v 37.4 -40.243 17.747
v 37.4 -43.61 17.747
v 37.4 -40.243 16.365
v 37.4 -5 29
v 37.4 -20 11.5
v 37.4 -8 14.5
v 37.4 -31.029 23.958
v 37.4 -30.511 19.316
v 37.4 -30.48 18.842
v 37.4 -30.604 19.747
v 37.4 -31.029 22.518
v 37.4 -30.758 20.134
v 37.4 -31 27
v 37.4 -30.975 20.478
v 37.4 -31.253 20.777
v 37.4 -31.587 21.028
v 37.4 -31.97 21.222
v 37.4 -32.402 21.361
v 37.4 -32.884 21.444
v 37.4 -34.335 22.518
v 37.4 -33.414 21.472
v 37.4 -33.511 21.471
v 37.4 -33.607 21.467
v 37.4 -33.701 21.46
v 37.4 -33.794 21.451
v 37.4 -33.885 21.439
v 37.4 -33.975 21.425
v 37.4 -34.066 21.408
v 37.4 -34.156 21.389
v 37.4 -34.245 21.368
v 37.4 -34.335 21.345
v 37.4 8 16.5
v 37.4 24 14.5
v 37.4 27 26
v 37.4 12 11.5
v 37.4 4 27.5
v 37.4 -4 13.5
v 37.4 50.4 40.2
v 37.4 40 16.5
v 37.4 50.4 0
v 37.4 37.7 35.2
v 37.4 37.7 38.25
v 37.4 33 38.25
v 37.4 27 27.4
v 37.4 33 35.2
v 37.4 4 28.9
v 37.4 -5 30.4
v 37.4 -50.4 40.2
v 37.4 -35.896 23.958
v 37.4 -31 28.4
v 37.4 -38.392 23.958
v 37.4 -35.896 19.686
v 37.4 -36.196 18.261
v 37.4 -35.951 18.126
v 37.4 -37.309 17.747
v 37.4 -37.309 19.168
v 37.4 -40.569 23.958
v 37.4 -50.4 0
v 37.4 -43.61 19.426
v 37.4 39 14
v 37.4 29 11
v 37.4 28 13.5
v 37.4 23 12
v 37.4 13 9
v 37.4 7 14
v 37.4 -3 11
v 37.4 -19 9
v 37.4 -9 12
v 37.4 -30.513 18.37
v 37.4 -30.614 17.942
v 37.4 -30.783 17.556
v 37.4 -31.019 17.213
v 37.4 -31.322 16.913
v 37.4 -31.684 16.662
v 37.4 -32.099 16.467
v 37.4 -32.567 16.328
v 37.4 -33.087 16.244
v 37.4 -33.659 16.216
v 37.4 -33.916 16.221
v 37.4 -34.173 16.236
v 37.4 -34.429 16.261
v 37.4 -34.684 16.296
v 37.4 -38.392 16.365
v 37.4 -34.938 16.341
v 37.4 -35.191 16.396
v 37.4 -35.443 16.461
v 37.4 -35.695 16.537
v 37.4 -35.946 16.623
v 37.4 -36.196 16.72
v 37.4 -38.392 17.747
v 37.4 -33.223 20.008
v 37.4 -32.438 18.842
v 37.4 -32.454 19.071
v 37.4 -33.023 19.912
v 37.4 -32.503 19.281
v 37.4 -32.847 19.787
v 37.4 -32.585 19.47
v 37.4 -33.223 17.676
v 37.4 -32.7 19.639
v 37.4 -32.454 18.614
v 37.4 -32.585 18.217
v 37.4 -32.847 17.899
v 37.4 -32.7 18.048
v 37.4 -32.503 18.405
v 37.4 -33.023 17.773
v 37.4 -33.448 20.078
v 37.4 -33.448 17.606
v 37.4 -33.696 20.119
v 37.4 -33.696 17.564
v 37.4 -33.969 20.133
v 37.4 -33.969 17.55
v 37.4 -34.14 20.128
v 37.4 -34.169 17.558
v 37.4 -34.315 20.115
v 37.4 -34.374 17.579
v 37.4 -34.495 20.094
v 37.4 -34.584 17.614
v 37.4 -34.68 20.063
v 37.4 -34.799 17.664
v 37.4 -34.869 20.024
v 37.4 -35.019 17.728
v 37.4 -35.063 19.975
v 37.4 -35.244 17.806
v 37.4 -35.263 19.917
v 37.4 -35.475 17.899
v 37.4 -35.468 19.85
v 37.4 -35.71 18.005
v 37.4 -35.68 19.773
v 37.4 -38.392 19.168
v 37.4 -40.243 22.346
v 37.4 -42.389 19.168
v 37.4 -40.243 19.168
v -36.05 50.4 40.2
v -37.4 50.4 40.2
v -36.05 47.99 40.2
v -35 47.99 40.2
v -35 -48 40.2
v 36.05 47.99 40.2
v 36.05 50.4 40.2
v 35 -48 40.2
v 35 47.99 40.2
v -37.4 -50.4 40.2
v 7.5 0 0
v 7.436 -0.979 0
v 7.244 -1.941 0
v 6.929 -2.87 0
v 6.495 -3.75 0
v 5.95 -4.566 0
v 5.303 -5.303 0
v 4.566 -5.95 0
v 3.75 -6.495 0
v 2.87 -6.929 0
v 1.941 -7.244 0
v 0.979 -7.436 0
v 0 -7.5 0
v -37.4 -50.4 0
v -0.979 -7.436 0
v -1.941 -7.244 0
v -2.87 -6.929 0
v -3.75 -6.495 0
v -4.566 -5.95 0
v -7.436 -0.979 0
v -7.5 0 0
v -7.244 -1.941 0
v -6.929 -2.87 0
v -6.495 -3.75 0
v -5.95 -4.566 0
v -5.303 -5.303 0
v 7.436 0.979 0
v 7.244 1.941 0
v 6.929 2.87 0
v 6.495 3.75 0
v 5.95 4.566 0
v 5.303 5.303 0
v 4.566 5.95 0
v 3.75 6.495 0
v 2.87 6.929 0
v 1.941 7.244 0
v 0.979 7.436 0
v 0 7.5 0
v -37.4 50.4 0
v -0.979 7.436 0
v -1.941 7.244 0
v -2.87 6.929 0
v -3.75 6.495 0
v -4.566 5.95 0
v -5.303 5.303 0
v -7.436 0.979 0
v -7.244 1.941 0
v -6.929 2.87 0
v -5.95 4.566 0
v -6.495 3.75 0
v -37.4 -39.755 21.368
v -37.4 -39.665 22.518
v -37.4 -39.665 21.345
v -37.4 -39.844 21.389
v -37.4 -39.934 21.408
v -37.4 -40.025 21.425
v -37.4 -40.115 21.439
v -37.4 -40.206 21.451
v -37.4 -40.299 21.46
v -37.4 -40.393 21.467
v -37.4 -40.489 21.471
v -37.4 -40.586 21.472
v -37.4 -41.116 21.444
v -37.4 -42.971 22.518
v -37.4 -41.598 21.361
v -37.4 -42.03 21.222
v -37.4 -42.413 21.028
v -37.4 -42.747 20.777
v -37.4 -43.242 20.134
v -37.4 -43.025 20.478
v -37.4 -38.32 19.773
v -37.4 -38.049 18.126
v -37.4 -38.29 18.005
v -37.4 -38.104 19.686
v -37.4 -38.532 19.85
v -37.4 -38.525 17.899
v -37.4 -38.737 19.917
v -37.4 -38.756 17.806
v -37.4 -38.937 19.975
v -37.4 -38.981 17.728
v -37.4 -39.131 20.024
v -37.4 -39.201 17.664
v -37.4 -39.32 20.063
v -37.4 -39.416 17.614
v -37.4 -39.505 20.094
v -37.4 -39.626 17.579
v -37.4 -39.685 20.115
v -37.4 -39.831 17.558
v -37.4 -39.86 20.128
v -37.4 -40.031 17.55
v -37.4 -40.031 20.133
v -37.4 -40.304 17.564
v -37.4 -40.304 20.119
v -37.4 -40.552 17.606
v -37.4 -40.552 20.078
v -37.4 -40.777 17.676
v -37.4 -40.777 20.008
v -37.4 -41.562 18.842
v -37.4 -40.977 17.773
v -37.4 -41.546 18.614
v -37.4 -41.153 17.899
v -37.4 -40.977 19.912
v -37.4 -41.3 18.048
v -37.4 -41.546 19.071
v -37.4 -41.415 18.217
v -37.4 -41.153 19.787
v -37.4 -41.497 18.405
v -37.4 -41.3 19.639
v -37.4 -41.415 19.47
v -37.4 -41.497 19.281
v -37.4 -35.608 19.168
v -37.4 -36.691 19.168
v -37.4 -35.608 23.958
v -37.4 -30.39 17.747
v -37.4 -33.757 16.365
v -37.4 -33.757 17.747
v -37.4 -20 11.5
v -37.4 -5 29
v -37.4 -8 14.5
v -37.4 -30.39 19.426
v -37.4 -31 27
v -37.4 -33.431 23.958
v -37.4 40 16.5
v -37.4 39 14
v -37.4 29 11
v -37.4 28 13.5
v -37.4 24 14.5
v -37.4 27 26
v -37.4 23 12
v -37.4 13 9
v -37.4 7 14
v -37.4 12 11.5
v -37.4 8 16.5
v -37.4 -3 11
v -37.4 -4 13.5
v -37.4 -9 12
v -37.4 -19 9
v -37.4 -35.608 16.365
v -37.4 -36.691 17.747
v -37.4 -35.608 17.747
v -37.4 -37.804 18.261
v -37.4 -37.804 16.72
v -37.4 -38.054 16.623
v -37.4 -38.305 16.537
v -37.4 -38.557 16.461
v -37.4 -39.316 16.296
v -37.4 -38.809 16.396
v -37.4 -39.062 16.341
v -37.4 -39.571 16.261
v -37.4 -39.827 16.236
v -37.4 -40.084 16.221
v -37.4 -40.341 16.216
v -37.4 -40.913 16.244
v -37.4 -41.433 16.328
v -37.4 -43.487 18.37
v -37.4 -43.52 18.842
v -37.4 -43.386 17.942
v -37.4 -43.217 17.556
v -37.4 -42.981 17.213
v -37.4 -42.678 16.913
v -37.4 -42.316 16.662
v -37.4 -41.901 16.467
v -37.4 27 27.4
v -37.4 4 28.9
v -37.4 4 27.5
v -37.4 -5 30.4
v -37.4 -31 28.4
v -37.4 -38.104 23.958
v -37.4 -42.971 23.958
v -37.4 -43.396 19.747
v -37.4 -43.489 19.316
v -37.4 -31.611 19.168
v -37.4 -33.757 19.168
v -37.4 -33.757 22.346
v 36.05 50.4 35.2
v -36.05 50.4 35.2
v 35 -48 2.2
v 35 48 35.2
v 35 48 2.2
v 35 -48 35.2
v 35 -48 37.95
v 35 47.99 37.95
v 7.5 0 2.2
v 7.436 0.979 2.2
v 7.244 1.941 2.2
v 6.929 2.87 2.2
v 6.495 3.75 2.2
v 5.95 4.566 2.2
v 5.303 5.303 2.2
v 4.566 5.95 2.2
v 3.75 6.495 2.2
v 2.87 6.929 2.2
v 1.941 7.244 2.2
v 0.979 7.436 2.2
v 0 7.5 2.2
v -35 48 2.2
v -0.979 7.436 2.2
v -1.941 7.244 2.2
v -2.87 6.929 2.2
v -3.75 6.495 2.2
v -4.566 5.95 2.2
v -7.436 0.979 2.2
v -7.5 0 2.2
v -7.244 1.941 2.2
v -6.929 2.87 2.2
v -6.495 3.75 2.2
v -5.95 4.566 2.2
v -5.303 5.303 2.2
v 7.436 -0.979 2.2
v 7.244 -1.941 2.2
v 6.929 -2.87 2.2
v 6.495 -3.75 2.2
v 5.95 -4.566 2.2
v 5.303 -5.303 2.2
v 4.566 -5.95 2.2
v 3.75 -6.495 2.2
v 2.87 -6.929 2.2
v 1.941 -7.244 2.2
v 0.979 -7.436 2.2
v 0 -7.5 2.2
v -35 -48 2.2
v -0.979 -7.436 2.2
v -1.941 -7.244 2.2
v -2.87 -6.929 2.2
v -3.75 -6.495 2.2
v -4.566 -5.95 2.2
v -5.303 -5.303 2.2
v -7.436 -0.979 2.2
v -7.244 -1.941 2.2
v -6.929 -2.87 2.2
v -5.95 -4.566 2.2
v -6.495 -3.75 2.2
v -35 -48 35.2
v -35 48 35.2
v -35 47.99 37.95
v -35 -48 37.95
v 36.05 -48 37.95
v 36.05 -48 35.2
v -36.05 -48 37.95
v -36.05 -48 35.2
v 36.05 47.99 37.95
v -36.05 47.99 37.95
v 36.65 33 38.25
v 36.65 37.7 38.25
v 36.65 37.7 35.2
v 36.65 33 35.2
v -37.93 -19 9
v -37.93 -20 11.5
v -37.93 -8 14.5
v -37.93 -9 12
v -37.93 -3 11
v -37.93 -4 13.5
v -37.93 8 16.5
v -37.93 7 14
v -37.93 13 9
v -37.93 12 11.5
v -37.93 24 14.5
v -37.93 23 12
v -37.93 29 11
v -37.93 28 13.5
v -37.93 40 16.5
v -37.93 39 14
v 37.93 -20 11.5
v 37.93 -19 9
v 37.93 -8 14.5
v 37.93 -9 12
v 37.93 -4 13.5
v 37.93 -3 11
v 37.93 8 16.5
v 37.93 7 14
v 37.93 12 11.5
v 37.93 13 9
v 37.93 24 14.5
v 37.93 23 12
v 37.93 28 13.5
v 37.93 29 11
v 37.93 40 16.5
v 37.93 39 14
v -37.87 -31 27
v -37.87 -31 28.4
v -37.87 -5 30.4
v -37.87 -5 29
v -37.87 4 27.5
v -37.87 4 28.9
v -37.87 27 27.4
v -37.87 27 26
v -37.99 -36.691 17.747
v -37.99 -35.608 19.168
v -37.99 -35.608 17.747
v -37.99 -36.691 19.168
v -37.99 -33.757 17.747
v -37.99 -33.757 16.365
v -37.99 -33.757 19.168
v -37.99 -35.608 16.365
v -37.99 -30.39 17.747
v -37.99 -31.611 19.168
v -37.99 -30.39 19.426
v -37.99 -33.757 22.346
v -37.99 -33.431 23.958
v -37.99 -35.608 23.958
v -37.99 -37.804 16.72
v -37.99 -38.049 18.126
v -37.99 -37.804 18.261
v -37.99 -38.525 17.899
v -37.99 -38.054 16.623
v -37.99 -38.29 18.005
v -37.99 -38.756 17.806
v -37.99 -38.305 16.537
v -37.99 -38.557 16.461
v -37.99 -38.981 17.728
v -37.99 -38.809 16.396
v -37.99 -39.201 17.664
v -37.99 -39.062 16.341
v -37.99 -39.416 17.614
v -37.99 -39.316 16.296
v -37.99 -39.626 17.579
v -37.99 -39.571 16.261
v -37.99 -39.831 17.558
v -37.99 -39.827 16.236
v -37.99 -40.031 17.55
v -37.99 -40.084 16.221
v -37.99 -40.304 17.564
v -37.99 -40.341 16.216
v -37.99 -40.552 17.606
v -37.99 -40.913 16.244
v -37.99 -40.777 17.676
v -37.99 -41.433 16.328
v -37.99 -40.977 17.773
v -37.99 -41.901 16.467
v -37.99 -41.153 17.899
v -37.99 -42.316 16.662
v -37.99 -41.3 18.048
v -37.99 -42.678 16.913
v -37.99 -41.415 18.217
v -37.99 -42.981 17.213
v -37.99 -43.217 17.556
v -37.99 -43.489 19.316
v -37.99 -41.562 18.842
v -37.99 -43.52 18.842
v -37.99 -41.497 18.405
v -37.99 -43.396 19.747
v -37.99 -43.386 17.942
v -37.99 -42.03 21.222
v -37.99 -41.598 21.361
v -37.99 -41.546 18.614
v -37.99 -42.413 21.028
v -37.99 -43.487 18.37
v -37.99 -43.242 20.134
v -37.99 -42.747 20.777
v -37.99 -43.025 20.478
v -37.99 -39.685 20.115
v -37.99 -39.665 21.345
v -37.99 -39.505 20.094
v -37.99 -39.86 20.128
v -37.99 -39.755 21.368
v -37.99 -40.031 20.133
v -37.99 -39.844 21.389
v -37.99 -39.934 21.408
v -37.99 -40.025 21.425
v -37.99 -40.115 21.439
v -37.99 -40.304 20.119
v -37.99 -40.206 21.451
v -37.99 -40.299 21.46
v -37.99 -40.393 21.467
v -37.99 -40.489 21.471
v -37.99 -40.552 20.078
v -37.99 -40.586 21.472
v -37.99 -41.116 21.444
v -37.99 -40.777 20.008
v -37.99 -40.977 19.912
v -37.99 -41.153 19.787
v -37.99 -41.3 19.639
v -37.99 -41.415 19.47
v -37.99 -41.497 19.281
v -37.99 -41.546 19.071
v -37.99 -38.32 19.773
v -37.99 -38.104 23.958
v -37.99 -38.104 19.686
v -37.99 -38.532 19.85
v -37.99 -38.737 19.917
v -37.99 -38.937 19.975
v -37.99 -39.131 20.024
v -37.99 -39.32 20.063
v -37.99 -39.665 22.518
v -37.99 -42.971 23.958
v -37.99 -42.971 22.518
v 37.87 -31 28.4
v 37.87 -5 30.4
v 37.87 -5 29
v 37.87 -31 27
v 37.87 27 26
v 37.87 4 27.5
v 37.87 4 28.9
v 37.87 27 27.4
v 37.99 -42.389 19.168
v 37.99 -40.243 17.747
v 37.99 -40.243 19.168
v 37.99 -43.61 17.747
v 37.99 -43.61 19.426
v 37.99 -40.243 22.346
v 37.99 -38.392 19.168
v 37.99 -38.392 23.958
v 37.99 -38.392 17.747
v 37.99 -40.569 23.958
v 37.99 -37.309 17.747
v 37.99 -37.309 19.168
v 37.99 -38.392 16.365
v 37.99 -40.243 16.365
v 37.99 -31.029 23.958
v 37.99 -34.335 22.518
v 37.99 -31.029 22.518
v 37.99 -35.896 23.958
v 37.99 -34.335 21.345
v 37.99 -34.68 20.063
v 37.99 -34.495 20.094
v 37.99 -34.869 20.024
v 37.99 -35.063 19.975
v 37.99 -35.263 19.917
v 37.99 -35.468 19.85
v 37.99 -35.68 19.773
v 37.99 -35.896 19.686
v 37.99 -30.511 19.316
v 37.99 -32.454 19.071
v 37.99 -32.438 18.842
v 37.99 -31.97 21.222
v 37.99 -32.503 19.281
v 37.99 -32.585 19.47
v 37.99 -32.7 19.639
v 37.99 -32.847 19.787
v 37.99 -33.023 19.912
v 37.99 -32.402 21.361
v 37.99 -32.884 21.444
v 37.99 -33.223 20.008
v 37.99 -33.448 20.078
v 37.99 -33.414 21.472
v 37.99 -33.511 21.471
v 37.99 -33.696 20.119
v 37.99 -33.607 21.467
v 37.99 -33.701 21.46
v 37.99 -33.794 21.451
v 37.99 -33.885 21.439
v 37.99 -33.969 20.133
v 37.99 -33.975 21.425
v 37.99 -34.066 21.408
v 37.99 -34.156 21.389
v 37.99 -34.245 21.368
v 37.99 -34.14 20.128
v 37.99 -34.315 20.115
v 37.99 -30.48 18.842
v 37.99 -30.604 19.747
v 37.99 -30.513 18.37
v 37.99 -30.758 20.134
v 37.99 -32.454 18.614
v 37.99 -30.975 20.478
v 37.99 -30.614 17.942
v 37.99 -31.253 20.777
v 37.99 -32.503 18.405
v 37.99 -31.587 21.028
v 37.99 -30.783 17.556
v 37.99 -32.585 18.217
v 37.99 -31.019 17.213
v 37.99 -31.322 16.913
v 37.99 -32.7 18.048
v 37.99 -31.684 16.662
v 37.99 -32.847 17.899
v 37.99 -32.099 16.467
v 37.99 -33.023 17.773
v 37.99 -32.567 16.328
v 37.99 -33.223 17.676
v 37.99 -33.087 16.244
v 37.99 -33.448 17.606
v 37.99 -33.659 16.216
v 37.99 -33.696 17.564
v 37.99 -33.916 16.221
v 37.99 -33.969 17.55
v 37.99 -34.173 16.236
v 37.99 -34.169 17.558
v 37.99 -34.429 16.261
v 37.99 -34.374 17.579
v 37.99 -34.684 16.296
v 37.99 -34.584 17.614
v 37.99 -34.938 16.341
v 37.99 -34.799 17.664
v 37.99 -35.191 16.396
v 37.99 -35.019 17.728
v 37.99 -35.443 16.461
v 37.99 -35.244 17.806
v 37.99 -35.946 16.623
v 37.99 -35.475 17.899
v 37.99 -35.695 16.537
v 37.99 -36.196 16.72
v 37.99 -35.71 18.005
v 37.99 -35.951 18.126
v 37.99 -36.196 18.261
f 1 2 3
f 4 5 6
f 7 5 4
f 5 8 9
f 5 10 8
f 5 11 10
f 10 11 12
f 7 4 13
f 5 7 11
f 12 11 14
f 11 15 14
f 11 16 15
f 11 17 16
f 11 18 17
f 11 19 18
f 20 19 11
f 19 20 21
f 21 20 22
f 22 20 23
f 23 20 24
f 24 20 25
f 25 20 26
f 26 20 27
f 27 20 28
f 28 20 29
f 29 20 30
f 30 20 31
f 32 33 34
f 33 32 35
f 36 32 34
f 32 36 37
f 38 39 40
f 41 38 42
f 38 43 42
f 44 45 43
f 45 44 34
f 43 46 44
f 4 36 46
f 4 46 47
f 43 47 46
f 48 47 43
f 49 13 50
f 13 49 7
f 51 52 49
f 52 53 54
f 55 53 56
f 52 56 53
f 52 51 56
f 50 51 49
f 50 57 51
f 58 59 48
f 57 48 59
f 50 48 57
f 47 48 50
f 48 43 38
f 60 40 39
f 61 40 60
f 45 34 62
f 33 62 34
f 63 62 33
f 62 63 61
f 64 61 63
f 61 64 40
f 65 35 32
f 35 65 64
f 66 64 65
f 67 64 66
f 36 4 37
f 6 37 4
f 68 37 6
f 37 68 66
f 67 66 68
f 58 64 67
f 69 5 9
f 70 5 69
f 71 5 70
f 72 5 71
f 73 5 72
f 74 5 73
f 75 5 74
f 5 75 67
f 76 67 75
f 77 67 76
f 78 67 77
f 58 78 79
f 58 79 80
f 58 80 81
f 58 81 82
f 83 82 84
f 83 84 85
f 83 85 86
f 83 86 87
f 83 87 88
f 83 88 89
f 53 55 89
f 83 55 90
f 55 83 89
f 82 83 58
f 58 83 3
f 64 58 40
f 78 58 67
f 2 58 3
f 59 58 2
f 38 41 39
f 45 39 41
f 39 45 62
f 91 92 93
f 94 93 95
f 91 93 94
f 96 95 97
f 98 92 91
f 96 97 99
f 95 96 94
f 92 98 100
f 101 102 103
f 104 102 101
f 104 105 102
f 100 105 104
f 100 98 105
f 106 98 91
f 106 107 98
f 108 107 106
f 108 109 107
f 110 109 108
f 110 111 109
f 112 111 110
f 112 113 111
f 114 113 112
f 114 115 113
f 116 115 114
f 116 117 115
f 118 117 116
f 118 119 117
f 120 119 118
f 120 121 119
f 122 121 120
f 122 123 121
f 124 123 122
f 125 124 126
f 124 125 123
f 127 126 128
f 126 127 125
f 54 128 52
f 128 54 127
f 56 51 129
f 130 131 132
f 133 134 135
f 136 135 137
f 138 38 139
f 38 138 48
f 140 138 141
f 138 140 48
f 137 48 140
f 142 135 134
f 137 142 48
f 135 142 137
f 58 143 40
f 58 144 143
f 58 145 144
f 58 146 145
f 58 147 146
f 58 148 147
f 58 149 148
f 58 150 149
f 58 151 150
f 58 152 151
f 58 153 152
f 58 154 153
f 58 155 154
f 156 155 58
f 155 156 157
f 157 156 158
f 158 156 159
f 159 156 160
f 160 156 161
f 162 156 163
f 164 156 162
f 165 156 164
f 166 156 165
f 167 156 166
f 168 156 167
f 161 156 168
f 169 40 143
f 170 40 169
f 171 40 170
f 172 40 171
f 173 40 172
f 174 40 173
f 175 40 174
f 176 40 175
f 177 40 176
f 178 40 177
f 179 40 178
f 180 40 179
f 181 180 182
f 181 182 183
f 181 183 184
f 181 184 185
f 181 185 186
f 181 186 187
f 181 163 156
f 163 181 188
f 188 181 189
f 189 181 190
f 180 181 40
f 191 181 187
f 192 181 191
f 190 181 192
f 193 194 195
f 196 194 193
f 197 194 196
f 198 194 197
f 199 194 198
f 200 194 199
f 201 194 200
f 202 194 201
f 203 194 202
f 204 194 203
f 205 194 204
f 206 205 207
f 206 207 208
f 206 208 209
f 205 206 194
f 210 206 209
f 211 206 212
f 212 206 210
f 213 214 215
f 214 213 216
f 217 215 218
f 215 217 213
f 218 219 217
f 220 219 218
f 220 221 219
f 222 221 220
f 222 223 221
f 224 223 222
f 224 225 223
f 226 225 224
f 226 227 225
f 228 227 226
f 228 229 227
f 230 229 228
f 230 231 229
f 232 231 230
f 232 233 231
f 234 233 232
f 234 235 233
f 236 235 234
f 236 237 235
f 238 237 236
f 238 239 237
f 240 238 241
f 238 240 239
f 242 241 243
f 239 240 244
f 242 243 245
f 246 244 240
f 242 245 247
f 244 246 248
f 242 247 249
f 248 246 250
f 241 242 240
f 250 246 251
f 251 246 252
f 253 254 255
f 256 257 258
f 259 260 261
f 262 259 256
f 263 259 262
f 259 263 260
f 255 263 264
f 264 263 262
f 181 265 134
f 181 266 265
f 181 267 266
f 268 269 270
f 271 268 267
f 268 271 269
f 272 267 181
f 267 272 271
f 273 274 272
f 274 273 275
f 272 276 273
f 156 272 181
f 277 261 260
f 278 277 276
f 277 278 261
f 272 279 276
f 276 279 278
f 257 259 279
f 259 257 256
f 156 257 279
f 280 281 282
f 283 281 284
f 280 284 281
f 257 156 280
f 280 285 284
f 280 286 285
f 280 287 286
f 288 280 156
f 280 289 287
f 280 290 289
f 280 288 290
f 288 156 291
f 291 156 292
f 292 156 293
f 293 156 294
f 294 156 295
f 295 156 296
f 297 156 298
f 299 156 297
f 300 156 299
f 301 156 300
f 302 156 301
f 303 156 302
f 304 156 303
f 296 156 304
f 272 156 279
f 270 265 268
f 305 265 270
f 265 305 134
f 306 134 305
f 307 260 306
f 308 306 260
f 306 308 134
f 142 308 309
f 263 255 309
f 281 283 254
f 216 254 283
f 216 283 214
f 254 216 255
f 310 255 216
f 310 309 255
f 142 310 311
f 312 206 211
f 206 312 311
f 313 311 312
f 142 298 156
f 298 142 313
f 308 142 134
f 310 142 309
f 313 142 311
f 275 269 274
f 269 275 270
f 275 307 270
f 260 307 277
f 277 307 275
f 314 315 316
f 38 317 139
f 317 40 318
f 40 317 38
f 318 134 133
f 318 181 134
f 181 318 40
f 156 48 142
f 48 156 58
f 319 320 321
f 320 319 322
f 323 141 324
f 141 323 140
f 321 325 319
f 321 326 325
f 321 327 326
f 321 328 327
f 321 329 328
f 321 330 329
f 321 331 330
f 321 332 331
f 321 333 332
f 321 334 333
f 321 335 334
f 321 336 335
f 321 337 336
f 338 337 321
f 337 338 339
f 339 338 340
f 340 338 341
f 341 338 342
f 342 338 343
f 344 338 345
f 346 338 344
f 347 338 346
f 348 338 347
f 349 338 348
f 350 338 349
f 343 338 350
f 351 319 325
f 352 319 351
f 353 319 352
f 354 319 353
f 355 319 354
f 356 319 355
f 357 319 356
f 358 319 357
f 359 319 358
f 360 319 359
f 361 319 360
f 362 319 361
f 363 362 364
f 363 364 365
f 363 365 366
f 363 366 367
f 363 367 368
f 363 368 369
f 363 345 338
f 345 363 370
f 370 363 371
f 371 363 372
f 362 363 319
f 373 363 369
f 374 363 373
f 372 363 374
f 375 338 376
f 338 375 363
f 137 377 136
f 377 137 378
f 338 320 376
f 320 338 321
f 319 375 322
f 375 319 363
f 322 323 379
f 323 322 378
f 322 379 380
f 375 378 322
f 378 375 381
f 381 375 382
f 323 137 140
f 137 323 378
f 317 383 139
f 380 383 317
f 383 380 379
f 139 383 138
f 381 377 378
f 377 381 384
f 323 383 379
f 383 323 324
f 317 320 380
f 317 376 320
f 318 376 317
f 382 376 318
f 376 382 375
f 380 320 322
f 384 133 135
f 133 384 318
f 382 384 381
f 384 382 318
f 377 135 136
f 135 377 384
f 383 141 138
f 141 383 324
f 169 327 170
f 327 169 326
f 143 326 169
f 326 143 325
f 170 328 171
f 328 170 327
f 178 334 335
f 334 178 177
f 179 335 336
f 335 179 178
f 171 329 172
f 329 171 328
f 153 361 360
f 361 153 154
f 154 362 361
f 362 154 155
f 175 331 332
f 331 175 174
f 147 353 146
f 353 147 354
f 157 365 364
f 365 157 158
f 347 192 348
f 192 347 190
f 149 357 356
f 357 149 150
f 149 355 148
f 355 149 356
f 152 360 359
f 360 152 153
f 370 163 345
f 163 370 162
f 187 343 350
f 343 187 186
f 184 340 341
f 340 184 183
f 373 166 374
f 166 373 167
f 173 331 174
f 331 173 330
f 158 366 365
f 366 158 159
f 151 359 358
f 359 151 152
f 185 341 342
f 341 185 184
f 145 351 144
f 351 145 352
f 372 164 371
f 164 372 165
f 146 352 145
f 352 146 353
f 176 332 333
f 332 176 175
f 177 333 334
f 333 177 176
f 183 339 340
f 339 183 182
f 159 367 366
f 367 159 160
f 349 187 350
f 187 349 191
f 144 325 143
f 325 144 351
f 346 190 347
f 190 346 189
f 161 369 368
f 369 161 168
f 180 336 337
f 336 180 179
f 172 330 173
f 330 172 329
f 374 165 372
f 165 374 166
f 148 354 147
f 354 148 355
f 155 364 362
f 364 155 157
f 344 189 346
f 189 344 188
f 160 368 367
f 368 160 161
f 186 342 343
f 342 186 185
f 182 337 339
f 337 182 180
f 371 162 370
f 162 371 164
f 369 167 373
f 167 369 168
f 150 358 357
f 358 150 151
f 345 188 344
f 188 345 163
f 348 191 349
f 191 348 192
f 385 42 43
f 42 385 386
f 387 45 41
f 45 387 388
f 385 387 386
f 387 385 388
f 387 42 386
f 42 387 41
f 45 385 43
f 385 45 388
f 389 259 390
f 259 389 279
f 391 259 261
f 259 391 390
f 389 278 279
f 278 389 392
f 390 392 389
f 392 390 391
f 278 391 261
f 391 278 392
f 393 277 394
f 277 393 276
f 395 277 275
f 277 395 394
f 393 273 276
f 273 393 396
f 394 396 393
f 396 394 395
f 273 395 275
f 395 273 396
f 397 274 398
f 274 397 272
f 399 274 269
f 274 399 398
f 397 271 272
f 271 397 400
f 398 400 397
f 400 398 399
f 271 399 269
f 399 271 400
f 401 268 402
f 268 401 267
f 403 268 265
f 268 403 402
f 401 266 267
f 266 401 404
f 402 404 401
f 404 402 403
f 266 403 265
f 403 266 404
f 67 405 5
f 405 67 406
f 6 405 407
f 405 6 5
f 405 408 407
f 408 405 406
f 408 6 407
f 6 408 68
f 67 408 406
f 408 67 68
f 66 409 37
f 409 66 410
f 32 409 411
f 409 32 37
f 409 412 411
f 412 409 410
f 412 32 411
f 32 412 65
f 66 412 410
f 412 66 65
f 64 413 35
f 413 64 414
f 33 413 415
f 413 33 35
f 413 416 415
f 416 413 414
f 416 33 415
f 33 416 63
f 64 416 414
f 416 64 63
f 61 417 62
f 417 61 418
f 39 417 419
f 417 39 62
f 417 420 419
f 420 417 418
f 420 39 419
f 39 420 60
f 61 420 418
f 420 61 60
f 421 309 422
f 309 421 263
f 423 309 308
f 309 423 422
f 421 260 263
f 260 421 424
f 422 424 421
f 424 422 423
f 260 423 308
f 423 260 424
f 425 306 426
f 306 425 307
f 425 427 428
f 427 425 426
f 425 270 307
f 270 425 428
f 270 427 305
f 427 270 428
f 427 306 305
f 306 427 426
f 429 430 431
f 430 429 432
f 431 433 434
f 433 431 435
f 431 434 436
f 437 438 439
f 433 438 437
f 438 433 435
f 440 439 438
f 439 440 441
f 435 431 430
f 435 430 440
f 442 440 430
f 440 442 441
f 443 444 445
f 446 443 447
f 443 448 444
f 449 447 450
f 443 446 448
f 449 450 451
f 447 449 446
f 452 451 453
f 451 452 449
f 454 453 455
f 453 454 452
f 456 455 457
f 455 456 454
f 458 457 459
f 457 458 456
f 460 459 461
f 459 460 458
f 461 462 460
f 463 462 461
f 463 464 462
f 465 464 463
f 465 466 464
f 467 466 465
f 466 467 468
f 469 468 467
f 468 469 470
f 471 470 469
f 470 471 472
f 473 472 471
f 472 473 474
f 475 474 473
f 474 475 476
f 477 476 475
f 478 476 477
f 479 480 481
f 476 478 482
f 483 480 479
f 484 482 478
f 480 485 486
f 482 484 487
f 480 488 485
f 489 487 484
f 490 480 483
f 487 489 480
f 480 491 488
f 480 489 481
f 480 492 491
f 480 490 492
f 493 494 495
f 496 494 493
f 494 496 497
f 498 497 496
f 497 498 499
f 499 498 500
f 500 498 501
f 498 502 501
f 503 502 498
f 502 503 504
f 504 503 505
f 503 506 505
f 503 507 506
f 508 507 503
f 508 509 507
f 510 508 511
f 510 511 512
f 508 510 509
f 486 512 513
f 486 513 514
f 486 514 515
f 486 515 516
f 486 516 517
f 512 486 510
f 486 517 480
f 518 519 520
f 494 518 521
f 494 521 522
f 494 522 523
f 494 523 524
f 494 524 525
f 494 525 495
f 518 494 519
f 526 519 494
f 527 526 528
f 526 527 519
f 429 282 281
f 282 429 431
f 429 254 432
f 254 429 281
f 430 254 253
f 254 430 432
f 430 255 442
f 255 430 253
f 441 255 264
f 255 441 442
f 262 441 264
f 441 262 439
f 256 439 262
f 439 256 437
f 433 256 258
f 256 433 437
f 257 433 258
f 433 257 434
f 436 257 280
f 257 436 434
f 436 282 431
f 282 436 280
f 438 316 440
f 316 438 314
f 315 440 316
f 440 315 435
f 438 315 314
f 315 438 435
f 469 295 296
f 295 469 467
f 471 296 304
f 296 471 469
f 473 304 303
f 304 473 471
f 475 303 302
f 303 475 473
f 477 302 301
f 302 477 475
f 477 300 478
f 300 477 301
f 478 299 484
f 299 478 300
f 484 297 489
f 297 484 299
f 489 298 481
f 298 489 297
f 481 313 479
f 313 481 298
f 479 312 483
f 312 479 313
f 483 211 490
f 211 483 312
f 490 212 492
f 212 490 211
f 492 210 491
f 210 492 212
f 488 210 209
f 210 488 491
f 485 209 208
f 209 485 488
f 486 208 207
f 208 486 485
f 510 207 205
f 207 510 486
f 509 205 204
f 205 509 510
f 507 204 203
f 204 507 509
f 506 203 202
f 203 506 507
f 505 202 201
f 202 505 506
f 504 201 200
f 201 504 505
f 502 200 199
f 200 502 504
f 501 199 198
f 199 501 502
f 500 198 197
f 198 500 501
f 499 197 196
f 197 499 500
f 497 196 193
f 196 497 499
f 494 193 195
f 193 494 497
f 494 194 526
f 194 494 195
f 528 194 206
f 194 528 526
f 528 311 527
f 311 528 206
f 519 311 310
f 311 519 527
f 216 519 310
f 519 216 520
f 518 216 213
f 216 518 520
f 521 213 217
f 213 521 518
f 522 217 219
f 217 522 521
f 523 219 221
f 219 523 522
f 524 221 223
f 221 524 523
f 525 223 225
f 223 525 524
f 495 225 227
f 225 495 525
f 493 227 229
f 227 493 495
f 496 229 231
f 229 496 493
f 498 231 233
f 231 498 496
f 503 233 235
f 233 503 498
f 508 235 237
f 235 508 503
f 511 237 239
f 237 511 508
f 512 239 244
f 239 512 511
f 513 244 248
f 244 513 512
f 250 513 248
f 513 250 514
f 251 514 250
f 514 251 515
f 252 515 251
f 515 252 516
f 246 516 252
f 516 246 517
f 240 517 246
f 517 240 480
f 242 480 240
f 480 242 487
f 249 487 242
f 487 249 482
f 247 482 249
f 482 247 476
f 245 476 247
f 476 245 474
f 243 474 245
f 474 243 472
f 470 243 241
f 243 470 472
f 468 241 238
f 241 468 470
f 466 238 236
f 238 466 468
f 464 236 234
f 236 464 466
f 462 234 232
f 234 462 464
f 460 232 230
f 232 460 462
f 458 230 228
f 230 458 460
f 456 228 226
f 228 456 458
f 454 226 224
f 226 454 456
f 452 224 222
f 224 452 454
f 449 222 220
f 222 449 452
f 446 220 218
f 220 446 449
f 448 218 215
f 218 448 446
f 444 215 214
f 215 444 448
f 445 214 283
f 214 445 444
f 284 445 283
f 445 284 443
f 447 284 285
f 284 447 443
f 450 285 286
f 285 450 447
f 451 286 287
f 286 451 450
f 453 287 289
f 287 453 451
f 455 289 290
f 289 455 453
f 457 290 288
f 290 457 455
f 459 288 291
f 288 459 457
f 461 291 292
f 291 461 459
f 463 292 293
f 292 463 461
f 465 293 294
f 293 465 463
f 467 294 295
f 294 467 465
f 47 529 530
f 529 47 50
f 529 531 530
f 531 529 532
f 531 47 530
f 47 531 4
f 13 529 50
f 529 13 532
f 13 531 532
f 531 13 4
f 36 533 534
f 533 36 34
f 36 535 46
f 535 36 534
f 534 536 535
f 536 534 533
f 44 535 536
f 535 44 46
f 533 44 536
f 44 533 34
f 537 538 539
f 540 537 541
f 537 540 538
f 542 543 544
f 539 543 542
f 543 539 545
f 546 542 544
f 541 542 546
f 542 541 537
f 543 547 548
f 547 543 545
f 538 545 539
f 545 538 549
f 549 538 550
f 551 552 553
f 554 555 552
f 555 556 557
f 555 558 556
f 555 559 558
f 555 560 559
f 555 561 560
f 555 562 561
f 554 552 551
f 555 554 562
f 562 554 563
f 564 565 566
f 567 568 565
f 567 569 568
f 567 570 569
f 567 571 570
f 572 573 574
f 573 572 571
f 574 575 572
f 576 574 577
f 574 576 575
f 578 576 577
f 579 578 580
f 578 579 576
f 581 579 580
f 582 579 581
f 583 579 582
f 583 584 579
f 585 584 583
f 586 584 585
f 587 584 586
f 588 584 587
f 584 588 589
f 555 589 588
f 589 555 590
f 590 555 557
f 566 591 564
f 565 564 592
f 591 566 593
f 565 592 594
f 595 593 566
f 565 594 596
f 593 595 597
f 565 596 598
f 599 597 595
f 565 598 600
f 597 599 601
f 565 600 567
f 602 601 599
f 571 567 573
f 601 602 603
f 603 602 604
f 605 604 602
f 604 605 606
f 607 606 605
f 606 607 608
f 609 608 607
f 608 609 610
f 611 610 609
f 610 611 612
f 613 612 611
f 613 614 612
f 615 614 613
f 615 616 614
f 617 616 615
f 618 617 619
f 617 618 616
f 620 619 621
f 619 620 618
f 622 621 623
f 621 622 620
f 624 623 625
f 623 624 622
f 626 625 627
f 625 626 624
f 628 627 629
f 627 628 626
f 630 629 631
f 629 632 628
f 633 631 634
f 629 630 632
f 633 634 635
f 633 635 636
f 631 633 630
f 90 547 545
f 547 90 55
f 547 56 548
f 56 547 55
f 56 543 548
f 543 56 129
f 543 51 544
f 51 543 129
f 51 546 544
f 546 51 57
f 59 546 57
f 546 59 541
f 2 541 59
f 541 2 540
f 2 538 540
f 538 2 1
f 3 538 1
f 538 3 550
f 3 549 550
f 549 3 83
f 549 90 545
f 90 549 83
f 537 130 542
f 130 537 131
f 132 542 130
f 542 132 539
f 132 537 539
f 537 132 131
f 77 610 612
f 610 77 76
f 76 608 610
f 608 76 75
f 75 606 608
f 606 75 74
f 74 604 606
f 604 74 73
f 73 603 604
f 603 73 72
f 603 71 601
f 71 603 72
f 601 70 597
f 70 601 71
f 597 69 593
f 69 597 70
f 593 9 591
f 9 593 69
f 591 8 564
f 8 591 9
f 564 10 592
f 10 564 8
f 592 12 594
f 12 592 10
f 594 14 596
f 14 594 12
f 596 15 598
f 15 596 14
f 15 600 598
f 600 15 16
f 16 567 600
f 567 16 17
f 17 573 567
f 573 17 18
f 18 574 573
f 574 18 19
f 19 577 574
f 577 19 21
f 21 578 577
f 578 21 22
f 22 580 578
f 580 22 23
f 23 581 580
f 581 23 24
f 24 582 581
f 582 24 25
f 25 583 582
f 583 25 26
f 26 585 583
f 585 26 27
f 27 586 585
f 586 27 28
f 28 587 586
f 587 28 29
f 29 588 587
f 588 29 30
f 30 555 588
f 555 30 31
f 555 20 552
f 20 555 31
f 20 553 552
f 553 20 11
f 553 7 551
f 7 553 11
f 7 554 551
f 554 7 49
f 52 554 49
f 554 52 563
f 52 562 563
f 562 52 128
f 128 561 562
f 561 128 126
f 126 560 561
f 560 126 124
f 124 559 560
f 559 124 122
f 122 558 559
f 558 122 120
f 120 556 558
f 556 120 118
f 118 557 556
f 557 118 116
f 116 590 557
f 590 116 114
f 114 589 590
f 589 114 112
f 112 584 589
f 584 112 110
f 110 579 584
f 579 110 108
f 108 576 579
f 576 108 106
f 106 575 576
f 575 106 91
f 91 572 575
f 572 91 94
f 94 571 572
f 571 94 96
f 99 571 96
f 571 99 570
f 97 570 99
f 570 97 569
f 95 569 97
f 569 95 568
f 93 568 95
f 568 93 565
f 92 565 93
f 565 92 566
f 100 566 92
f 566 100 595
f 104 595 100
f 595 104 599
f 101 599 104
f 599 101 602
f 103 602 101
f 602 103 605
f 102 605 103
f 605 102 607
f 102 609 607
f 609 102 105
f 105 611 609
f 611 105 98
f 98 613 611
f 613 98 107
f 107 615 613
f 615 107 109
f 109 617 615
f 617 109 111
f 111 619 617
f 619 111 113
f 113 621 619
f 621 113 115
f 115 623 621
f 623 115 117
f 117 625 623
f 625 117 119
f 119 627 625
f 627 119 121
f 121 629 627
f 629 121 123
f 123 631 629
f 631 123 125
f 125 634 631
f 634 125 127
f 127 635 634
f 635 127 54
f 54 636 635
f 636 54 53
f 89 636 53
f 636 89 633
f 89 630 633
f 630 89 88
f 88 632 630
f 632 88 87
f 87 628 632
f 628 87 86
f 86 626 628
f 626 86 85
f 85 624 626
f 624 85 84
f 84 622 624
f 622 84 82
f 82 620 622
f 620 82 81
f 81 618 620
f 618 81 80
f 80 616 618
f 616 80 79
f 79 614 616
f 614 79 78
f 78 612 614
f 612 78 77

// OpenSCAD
// Mood Swings-inspired flat V2 for one 45-card sleeved deck.
// The long, in-plane side clip on the lid is a positive travel lock. Pull the
// thumb pad away from the right side of the body to release it before sliding.
// Separate body and lid print on their broad, flat faces with no supports.
// Measured card stack cavity: 70 x 96 x 33 mm.
part = "body";
card_w = 70;
card_h = 96;
stack = 33;
wall = 2.4;
floor = 2.2;
W = card_w + 2*wall;
L = card_h + 2*wall;
channel = 1.05;
slide_clearance = 0.35;
lid_t = 2.25;
H = floor + stack + 5;
latch_notch_start = 33.0;
latch_notch_end = 37.7;
latch_notch_depth = 0.75;
latch_engagement = 0.55;
latch_beam_width = 1.4;
$fn = 32;

module side_mark(side, points, depth=0.58) {
  translate([side*(W/2-0.05),0,0]) rotate([0,side*90,0])
    linear_extrude(height=depth)
      polygon([for (p=points) [-side*p[1],p[0]]]);
}
module side_art() {
  for (side=[-1,1]) {
    // Broken, uneven ribbon pieces on the visible long sides.
    for (i=[0:3])
      let(y=-19+i*16, z=9+(i%2)*2)
        side_mark(side,[[y,z],[y+10,z+3],[y+11,z+5.5],[y-1,z+2.5]]);
    side_mark(side,[[-31,27],[-5,29],[-5,30.4],[-31,28.4]],0.52);
    side_mark(side,[[4,27.5],[27,26],[27,27.4],[4,28.9]],0.52);
    translate([side*(W/2-0.05),-37,20])
      rotate([0,side*90,0]) rotate([0,0,side*90])
        linear_extrude(height=0.64)
          text("45",size=7.5,font="DejaVu Sans:style=Bold",
               halign="center",valign="center");
  }
}

module body() {
  union() {
  difference() {
    translate([-W/2,-L/2,0]) cube([W,L,H]);
    translate([-card_w/2,-card_h/2,floor])
      cube([card_w,card_h,H+0.3]);
    // The enlarged slot leaves 2.25 mm roof rails and 0.25 mm vertical
    // clearance above/below a 2.25 mm lid. Each side supports 1.35 mm.
    translate([-card_w/2-channel,-card_h/2,H-5])
      cube([card_w+2*channel,card_h+wall+1,2.75]);
    // The end opening lets the lid slide in; the other end stays closed.
    translate([-card_w/2-channel,card_h/2-0.01,H-5])
      cube([card_w+2*channel,wall+1,5.3]);
    // Push the deck out with a fingertip after sliding the lid away.
    translate([0,0,-0.2]) cylinder(h=floor+0.4,d=15,$fn=48);
    // Recess in the outside of the right rail. Its front face is the hard
    // stop that catches the lid's hook when the lid tries to slide out.
    // The short roof above the recess bridges just 0.75 mm when printed.
    translate([W/2-latch_notch_depth,latch_notch_start,H-5])
      cube([latch_notch_depth+0.2,
            latch_notch_end-latch_notch_start,
            3.05]);
  }
  side_art();
  }
}

module lid_relief(points, depth=0.56) {
  translate([0,0,lid_t-0.05])
    linear_extrude(height=depth) polygon(points);
}
module lid_ink(depth=0.56) {
  translate([0,0,lid_t-0.05])
    linear_extrude(height=depth) children();
}
module lid_title(label, size, x, y, tilt=0) {
  translate([x,y,lid_t+0.60]) rotate([0,0,tilt])
    linear_extrude(height=0.75)
      text(label,size=size,font="DejaVu Sans:style=Bold",
           halign="center",valign="center");
}
module broken_arc(cx,cy,r1,r2,start,finish) {
  lid_relief(concat(
    [for (j=[0:7]) let(a=start+(finish-start)*j/7)
       [cx+r2*cos(a),cy+r2*sin(a)]],
    [for (j=[7:-1:0]) let(a=start+(finish-start)*j/7)
       [cx+r1*cos(a),cy+r1*sin(a)]]),0.60);
}
module lid_art() {
  // Raised, imperfect paper strips echo the game's hand-cut collage feeling.
  lid_relief([[-27,20],[24,22],[26,39],[-24,38]],0.38);
  lid_relief([[-26,21],[-7,21.4],[2,22.2],[23,22],[25,38],[-25,37]],0.78);
  lid_relief([[-24,-1],[28,0],[26,17],[-26,16]],0.38);
  lid_relief([[-23,0],[-3,-0.3],[8,0.7],[27,1],[25,16],[-25,15]],0.78);
  lid_title("MOOD",12,-1,30,2);
  lid_title("SWINGS",10.5,0,8,-2);

  // Five irregular mood-wheel segments orbit a generic five-pip die.
  for (i=[0:4]) broken_arc(0,-24,15.2,17.1,
                          9+i*72+(i%2)*3,60+i*72-(i%3)*2);
  lid_ink(0.70) translate([0,-24]) rotate(10)
    difference() {
      square([15.5,15.5],center=true);
      square([12.5,12.5],center=true);
    }
  lid_ink(0.70) translate([0,-24]) rotate(10)
    for (p=[[-4,-4],[-4,4],[0,0],[4,-4],[4,4]])
      translate(p) circle(d=2,$fn=16);

  // Faceted corner hatching and broken side rules.
  for (side=[-1,1]) {
    for (i=[0:3]) {
      lid_relief([[side*30,-41+i*4],
                  [side*32,-40+i*4],
                  [side*30,-36+i*4],
                  [side*28,-37+i*4]],0.56);
    }
    lid_relief([[side*30,19],[side*31,19],[side*31,39],[side*30,39]],0.52);
  }
  lid_relief([[-28,42],[-14,42.8],[-14,44],[-28,43.2]],0.56);
  lid_relief([[13,41.7],[29,42.4],[29,43.6],[13,42.9]],0.56);
}
module in_plane_latch() {
  beam_x = W/2+0.4;
  // A long, flat-printed beam gives silk PLA a small, repeatable deflection.
  // At rest the hook projects 0.55 mm into the body side; its shallow
  // approach ramp cams the beam out during insertion.
  translate([beam_x,36.8,0])
    cube([latch_beam_width,16.7,lid_t]);
  linear_extrude(height=lid_t)
    polygon([[beam_x,32.7],
             [W/2-latch_engagement,35.2],
             [W/2-latch_engagement,37.4],
             [beam_x+1.0,37.4]]);
  // Round the loaded root so it has no sharp re-entrant corner.
  translate([beam_x+latch_beam_width/2,51.7,0])
    cylinder(h=lid_t,r=1.2,$fn=32);
  // Exposed pad: hook it outward about 1 mm, then pull the lid's end stop.
  translate([beam_x+0.7,33.8,0])
    cube([2.25,4.5,lid_t]);
  for (y=[34.2:1.15:37.65])
    translate([beam_x+latch_beam_width+0.3,y,lid_t-0.02])
      cube([0.9,0.42,0.38]);
}
module lid() {
  lid_w = card_w+2*channel-2*slide_clearance;
  lid_l = card_h+wall+0.4;
  union() {
    // Rail edges and underside stay smooth for the sliding fit.
    translate([-lid_w/2,-card_h/2+slide_clearance,0])
      cube([lid_w,lid_l,lid_t]);
    translate([-W/2,card_h/2+wall+0.1,0])
      cube([W,3,5]);
    // Extend the stop to anchor the cantilever outside the tray wall.
    translate([W/2-0.2,card_h/2+wall+0.1,0])
      cube([2.2,3,5]);
    in_plane_latch();
    lid_art();
    // Raised grip bars on the external stop for thumb access.
    for (x=[-12,-4,4,12])
      translate([x-1,card_h/2+wall+0.65,4.95])
        cube([2,1.5,0.55]);
  }
}
module fit_gauge() {
  // This coupon retains the actual mouth, stop, recess, spring beam, ramp,
  // and release pad. It tests a real locked closure rather than just rails.
  translate([-50,-40,-(H-11)])
    intersection() {
      body();
      translate([-W/2-4,28.5,H-11]) cube([W+9,26,11.1]);
    }
  // Mating 26 mm lid section includes the full-length external side clip.
  translate([50,-40,0])
    intersection() {
      lid();
      translate([-W/2-4,28.5,-0.1]) cube([W+9,26,6]);
    }
  // A full-width 70 x 33 mm hole checks one 45-card stack edge-on.
  // The 92 mm card length extends out of this cheap, low ring.
  translate([0,65,0])
    difference() {
      translate([-W/2,-(stack+2*wall)/2,0])
        cube([W,stack+2*wall,6]);
      translate([-card_w/2,-stack/2,-0.2])
        cube([card_w,stack,6.4]);
    }
}
if (part=="body") body();
else if (part=="lid") lid();
else if (part=="fit_gauge") fit_gauge();
else assert(false,"part must be body, lid or fit_gauge");
